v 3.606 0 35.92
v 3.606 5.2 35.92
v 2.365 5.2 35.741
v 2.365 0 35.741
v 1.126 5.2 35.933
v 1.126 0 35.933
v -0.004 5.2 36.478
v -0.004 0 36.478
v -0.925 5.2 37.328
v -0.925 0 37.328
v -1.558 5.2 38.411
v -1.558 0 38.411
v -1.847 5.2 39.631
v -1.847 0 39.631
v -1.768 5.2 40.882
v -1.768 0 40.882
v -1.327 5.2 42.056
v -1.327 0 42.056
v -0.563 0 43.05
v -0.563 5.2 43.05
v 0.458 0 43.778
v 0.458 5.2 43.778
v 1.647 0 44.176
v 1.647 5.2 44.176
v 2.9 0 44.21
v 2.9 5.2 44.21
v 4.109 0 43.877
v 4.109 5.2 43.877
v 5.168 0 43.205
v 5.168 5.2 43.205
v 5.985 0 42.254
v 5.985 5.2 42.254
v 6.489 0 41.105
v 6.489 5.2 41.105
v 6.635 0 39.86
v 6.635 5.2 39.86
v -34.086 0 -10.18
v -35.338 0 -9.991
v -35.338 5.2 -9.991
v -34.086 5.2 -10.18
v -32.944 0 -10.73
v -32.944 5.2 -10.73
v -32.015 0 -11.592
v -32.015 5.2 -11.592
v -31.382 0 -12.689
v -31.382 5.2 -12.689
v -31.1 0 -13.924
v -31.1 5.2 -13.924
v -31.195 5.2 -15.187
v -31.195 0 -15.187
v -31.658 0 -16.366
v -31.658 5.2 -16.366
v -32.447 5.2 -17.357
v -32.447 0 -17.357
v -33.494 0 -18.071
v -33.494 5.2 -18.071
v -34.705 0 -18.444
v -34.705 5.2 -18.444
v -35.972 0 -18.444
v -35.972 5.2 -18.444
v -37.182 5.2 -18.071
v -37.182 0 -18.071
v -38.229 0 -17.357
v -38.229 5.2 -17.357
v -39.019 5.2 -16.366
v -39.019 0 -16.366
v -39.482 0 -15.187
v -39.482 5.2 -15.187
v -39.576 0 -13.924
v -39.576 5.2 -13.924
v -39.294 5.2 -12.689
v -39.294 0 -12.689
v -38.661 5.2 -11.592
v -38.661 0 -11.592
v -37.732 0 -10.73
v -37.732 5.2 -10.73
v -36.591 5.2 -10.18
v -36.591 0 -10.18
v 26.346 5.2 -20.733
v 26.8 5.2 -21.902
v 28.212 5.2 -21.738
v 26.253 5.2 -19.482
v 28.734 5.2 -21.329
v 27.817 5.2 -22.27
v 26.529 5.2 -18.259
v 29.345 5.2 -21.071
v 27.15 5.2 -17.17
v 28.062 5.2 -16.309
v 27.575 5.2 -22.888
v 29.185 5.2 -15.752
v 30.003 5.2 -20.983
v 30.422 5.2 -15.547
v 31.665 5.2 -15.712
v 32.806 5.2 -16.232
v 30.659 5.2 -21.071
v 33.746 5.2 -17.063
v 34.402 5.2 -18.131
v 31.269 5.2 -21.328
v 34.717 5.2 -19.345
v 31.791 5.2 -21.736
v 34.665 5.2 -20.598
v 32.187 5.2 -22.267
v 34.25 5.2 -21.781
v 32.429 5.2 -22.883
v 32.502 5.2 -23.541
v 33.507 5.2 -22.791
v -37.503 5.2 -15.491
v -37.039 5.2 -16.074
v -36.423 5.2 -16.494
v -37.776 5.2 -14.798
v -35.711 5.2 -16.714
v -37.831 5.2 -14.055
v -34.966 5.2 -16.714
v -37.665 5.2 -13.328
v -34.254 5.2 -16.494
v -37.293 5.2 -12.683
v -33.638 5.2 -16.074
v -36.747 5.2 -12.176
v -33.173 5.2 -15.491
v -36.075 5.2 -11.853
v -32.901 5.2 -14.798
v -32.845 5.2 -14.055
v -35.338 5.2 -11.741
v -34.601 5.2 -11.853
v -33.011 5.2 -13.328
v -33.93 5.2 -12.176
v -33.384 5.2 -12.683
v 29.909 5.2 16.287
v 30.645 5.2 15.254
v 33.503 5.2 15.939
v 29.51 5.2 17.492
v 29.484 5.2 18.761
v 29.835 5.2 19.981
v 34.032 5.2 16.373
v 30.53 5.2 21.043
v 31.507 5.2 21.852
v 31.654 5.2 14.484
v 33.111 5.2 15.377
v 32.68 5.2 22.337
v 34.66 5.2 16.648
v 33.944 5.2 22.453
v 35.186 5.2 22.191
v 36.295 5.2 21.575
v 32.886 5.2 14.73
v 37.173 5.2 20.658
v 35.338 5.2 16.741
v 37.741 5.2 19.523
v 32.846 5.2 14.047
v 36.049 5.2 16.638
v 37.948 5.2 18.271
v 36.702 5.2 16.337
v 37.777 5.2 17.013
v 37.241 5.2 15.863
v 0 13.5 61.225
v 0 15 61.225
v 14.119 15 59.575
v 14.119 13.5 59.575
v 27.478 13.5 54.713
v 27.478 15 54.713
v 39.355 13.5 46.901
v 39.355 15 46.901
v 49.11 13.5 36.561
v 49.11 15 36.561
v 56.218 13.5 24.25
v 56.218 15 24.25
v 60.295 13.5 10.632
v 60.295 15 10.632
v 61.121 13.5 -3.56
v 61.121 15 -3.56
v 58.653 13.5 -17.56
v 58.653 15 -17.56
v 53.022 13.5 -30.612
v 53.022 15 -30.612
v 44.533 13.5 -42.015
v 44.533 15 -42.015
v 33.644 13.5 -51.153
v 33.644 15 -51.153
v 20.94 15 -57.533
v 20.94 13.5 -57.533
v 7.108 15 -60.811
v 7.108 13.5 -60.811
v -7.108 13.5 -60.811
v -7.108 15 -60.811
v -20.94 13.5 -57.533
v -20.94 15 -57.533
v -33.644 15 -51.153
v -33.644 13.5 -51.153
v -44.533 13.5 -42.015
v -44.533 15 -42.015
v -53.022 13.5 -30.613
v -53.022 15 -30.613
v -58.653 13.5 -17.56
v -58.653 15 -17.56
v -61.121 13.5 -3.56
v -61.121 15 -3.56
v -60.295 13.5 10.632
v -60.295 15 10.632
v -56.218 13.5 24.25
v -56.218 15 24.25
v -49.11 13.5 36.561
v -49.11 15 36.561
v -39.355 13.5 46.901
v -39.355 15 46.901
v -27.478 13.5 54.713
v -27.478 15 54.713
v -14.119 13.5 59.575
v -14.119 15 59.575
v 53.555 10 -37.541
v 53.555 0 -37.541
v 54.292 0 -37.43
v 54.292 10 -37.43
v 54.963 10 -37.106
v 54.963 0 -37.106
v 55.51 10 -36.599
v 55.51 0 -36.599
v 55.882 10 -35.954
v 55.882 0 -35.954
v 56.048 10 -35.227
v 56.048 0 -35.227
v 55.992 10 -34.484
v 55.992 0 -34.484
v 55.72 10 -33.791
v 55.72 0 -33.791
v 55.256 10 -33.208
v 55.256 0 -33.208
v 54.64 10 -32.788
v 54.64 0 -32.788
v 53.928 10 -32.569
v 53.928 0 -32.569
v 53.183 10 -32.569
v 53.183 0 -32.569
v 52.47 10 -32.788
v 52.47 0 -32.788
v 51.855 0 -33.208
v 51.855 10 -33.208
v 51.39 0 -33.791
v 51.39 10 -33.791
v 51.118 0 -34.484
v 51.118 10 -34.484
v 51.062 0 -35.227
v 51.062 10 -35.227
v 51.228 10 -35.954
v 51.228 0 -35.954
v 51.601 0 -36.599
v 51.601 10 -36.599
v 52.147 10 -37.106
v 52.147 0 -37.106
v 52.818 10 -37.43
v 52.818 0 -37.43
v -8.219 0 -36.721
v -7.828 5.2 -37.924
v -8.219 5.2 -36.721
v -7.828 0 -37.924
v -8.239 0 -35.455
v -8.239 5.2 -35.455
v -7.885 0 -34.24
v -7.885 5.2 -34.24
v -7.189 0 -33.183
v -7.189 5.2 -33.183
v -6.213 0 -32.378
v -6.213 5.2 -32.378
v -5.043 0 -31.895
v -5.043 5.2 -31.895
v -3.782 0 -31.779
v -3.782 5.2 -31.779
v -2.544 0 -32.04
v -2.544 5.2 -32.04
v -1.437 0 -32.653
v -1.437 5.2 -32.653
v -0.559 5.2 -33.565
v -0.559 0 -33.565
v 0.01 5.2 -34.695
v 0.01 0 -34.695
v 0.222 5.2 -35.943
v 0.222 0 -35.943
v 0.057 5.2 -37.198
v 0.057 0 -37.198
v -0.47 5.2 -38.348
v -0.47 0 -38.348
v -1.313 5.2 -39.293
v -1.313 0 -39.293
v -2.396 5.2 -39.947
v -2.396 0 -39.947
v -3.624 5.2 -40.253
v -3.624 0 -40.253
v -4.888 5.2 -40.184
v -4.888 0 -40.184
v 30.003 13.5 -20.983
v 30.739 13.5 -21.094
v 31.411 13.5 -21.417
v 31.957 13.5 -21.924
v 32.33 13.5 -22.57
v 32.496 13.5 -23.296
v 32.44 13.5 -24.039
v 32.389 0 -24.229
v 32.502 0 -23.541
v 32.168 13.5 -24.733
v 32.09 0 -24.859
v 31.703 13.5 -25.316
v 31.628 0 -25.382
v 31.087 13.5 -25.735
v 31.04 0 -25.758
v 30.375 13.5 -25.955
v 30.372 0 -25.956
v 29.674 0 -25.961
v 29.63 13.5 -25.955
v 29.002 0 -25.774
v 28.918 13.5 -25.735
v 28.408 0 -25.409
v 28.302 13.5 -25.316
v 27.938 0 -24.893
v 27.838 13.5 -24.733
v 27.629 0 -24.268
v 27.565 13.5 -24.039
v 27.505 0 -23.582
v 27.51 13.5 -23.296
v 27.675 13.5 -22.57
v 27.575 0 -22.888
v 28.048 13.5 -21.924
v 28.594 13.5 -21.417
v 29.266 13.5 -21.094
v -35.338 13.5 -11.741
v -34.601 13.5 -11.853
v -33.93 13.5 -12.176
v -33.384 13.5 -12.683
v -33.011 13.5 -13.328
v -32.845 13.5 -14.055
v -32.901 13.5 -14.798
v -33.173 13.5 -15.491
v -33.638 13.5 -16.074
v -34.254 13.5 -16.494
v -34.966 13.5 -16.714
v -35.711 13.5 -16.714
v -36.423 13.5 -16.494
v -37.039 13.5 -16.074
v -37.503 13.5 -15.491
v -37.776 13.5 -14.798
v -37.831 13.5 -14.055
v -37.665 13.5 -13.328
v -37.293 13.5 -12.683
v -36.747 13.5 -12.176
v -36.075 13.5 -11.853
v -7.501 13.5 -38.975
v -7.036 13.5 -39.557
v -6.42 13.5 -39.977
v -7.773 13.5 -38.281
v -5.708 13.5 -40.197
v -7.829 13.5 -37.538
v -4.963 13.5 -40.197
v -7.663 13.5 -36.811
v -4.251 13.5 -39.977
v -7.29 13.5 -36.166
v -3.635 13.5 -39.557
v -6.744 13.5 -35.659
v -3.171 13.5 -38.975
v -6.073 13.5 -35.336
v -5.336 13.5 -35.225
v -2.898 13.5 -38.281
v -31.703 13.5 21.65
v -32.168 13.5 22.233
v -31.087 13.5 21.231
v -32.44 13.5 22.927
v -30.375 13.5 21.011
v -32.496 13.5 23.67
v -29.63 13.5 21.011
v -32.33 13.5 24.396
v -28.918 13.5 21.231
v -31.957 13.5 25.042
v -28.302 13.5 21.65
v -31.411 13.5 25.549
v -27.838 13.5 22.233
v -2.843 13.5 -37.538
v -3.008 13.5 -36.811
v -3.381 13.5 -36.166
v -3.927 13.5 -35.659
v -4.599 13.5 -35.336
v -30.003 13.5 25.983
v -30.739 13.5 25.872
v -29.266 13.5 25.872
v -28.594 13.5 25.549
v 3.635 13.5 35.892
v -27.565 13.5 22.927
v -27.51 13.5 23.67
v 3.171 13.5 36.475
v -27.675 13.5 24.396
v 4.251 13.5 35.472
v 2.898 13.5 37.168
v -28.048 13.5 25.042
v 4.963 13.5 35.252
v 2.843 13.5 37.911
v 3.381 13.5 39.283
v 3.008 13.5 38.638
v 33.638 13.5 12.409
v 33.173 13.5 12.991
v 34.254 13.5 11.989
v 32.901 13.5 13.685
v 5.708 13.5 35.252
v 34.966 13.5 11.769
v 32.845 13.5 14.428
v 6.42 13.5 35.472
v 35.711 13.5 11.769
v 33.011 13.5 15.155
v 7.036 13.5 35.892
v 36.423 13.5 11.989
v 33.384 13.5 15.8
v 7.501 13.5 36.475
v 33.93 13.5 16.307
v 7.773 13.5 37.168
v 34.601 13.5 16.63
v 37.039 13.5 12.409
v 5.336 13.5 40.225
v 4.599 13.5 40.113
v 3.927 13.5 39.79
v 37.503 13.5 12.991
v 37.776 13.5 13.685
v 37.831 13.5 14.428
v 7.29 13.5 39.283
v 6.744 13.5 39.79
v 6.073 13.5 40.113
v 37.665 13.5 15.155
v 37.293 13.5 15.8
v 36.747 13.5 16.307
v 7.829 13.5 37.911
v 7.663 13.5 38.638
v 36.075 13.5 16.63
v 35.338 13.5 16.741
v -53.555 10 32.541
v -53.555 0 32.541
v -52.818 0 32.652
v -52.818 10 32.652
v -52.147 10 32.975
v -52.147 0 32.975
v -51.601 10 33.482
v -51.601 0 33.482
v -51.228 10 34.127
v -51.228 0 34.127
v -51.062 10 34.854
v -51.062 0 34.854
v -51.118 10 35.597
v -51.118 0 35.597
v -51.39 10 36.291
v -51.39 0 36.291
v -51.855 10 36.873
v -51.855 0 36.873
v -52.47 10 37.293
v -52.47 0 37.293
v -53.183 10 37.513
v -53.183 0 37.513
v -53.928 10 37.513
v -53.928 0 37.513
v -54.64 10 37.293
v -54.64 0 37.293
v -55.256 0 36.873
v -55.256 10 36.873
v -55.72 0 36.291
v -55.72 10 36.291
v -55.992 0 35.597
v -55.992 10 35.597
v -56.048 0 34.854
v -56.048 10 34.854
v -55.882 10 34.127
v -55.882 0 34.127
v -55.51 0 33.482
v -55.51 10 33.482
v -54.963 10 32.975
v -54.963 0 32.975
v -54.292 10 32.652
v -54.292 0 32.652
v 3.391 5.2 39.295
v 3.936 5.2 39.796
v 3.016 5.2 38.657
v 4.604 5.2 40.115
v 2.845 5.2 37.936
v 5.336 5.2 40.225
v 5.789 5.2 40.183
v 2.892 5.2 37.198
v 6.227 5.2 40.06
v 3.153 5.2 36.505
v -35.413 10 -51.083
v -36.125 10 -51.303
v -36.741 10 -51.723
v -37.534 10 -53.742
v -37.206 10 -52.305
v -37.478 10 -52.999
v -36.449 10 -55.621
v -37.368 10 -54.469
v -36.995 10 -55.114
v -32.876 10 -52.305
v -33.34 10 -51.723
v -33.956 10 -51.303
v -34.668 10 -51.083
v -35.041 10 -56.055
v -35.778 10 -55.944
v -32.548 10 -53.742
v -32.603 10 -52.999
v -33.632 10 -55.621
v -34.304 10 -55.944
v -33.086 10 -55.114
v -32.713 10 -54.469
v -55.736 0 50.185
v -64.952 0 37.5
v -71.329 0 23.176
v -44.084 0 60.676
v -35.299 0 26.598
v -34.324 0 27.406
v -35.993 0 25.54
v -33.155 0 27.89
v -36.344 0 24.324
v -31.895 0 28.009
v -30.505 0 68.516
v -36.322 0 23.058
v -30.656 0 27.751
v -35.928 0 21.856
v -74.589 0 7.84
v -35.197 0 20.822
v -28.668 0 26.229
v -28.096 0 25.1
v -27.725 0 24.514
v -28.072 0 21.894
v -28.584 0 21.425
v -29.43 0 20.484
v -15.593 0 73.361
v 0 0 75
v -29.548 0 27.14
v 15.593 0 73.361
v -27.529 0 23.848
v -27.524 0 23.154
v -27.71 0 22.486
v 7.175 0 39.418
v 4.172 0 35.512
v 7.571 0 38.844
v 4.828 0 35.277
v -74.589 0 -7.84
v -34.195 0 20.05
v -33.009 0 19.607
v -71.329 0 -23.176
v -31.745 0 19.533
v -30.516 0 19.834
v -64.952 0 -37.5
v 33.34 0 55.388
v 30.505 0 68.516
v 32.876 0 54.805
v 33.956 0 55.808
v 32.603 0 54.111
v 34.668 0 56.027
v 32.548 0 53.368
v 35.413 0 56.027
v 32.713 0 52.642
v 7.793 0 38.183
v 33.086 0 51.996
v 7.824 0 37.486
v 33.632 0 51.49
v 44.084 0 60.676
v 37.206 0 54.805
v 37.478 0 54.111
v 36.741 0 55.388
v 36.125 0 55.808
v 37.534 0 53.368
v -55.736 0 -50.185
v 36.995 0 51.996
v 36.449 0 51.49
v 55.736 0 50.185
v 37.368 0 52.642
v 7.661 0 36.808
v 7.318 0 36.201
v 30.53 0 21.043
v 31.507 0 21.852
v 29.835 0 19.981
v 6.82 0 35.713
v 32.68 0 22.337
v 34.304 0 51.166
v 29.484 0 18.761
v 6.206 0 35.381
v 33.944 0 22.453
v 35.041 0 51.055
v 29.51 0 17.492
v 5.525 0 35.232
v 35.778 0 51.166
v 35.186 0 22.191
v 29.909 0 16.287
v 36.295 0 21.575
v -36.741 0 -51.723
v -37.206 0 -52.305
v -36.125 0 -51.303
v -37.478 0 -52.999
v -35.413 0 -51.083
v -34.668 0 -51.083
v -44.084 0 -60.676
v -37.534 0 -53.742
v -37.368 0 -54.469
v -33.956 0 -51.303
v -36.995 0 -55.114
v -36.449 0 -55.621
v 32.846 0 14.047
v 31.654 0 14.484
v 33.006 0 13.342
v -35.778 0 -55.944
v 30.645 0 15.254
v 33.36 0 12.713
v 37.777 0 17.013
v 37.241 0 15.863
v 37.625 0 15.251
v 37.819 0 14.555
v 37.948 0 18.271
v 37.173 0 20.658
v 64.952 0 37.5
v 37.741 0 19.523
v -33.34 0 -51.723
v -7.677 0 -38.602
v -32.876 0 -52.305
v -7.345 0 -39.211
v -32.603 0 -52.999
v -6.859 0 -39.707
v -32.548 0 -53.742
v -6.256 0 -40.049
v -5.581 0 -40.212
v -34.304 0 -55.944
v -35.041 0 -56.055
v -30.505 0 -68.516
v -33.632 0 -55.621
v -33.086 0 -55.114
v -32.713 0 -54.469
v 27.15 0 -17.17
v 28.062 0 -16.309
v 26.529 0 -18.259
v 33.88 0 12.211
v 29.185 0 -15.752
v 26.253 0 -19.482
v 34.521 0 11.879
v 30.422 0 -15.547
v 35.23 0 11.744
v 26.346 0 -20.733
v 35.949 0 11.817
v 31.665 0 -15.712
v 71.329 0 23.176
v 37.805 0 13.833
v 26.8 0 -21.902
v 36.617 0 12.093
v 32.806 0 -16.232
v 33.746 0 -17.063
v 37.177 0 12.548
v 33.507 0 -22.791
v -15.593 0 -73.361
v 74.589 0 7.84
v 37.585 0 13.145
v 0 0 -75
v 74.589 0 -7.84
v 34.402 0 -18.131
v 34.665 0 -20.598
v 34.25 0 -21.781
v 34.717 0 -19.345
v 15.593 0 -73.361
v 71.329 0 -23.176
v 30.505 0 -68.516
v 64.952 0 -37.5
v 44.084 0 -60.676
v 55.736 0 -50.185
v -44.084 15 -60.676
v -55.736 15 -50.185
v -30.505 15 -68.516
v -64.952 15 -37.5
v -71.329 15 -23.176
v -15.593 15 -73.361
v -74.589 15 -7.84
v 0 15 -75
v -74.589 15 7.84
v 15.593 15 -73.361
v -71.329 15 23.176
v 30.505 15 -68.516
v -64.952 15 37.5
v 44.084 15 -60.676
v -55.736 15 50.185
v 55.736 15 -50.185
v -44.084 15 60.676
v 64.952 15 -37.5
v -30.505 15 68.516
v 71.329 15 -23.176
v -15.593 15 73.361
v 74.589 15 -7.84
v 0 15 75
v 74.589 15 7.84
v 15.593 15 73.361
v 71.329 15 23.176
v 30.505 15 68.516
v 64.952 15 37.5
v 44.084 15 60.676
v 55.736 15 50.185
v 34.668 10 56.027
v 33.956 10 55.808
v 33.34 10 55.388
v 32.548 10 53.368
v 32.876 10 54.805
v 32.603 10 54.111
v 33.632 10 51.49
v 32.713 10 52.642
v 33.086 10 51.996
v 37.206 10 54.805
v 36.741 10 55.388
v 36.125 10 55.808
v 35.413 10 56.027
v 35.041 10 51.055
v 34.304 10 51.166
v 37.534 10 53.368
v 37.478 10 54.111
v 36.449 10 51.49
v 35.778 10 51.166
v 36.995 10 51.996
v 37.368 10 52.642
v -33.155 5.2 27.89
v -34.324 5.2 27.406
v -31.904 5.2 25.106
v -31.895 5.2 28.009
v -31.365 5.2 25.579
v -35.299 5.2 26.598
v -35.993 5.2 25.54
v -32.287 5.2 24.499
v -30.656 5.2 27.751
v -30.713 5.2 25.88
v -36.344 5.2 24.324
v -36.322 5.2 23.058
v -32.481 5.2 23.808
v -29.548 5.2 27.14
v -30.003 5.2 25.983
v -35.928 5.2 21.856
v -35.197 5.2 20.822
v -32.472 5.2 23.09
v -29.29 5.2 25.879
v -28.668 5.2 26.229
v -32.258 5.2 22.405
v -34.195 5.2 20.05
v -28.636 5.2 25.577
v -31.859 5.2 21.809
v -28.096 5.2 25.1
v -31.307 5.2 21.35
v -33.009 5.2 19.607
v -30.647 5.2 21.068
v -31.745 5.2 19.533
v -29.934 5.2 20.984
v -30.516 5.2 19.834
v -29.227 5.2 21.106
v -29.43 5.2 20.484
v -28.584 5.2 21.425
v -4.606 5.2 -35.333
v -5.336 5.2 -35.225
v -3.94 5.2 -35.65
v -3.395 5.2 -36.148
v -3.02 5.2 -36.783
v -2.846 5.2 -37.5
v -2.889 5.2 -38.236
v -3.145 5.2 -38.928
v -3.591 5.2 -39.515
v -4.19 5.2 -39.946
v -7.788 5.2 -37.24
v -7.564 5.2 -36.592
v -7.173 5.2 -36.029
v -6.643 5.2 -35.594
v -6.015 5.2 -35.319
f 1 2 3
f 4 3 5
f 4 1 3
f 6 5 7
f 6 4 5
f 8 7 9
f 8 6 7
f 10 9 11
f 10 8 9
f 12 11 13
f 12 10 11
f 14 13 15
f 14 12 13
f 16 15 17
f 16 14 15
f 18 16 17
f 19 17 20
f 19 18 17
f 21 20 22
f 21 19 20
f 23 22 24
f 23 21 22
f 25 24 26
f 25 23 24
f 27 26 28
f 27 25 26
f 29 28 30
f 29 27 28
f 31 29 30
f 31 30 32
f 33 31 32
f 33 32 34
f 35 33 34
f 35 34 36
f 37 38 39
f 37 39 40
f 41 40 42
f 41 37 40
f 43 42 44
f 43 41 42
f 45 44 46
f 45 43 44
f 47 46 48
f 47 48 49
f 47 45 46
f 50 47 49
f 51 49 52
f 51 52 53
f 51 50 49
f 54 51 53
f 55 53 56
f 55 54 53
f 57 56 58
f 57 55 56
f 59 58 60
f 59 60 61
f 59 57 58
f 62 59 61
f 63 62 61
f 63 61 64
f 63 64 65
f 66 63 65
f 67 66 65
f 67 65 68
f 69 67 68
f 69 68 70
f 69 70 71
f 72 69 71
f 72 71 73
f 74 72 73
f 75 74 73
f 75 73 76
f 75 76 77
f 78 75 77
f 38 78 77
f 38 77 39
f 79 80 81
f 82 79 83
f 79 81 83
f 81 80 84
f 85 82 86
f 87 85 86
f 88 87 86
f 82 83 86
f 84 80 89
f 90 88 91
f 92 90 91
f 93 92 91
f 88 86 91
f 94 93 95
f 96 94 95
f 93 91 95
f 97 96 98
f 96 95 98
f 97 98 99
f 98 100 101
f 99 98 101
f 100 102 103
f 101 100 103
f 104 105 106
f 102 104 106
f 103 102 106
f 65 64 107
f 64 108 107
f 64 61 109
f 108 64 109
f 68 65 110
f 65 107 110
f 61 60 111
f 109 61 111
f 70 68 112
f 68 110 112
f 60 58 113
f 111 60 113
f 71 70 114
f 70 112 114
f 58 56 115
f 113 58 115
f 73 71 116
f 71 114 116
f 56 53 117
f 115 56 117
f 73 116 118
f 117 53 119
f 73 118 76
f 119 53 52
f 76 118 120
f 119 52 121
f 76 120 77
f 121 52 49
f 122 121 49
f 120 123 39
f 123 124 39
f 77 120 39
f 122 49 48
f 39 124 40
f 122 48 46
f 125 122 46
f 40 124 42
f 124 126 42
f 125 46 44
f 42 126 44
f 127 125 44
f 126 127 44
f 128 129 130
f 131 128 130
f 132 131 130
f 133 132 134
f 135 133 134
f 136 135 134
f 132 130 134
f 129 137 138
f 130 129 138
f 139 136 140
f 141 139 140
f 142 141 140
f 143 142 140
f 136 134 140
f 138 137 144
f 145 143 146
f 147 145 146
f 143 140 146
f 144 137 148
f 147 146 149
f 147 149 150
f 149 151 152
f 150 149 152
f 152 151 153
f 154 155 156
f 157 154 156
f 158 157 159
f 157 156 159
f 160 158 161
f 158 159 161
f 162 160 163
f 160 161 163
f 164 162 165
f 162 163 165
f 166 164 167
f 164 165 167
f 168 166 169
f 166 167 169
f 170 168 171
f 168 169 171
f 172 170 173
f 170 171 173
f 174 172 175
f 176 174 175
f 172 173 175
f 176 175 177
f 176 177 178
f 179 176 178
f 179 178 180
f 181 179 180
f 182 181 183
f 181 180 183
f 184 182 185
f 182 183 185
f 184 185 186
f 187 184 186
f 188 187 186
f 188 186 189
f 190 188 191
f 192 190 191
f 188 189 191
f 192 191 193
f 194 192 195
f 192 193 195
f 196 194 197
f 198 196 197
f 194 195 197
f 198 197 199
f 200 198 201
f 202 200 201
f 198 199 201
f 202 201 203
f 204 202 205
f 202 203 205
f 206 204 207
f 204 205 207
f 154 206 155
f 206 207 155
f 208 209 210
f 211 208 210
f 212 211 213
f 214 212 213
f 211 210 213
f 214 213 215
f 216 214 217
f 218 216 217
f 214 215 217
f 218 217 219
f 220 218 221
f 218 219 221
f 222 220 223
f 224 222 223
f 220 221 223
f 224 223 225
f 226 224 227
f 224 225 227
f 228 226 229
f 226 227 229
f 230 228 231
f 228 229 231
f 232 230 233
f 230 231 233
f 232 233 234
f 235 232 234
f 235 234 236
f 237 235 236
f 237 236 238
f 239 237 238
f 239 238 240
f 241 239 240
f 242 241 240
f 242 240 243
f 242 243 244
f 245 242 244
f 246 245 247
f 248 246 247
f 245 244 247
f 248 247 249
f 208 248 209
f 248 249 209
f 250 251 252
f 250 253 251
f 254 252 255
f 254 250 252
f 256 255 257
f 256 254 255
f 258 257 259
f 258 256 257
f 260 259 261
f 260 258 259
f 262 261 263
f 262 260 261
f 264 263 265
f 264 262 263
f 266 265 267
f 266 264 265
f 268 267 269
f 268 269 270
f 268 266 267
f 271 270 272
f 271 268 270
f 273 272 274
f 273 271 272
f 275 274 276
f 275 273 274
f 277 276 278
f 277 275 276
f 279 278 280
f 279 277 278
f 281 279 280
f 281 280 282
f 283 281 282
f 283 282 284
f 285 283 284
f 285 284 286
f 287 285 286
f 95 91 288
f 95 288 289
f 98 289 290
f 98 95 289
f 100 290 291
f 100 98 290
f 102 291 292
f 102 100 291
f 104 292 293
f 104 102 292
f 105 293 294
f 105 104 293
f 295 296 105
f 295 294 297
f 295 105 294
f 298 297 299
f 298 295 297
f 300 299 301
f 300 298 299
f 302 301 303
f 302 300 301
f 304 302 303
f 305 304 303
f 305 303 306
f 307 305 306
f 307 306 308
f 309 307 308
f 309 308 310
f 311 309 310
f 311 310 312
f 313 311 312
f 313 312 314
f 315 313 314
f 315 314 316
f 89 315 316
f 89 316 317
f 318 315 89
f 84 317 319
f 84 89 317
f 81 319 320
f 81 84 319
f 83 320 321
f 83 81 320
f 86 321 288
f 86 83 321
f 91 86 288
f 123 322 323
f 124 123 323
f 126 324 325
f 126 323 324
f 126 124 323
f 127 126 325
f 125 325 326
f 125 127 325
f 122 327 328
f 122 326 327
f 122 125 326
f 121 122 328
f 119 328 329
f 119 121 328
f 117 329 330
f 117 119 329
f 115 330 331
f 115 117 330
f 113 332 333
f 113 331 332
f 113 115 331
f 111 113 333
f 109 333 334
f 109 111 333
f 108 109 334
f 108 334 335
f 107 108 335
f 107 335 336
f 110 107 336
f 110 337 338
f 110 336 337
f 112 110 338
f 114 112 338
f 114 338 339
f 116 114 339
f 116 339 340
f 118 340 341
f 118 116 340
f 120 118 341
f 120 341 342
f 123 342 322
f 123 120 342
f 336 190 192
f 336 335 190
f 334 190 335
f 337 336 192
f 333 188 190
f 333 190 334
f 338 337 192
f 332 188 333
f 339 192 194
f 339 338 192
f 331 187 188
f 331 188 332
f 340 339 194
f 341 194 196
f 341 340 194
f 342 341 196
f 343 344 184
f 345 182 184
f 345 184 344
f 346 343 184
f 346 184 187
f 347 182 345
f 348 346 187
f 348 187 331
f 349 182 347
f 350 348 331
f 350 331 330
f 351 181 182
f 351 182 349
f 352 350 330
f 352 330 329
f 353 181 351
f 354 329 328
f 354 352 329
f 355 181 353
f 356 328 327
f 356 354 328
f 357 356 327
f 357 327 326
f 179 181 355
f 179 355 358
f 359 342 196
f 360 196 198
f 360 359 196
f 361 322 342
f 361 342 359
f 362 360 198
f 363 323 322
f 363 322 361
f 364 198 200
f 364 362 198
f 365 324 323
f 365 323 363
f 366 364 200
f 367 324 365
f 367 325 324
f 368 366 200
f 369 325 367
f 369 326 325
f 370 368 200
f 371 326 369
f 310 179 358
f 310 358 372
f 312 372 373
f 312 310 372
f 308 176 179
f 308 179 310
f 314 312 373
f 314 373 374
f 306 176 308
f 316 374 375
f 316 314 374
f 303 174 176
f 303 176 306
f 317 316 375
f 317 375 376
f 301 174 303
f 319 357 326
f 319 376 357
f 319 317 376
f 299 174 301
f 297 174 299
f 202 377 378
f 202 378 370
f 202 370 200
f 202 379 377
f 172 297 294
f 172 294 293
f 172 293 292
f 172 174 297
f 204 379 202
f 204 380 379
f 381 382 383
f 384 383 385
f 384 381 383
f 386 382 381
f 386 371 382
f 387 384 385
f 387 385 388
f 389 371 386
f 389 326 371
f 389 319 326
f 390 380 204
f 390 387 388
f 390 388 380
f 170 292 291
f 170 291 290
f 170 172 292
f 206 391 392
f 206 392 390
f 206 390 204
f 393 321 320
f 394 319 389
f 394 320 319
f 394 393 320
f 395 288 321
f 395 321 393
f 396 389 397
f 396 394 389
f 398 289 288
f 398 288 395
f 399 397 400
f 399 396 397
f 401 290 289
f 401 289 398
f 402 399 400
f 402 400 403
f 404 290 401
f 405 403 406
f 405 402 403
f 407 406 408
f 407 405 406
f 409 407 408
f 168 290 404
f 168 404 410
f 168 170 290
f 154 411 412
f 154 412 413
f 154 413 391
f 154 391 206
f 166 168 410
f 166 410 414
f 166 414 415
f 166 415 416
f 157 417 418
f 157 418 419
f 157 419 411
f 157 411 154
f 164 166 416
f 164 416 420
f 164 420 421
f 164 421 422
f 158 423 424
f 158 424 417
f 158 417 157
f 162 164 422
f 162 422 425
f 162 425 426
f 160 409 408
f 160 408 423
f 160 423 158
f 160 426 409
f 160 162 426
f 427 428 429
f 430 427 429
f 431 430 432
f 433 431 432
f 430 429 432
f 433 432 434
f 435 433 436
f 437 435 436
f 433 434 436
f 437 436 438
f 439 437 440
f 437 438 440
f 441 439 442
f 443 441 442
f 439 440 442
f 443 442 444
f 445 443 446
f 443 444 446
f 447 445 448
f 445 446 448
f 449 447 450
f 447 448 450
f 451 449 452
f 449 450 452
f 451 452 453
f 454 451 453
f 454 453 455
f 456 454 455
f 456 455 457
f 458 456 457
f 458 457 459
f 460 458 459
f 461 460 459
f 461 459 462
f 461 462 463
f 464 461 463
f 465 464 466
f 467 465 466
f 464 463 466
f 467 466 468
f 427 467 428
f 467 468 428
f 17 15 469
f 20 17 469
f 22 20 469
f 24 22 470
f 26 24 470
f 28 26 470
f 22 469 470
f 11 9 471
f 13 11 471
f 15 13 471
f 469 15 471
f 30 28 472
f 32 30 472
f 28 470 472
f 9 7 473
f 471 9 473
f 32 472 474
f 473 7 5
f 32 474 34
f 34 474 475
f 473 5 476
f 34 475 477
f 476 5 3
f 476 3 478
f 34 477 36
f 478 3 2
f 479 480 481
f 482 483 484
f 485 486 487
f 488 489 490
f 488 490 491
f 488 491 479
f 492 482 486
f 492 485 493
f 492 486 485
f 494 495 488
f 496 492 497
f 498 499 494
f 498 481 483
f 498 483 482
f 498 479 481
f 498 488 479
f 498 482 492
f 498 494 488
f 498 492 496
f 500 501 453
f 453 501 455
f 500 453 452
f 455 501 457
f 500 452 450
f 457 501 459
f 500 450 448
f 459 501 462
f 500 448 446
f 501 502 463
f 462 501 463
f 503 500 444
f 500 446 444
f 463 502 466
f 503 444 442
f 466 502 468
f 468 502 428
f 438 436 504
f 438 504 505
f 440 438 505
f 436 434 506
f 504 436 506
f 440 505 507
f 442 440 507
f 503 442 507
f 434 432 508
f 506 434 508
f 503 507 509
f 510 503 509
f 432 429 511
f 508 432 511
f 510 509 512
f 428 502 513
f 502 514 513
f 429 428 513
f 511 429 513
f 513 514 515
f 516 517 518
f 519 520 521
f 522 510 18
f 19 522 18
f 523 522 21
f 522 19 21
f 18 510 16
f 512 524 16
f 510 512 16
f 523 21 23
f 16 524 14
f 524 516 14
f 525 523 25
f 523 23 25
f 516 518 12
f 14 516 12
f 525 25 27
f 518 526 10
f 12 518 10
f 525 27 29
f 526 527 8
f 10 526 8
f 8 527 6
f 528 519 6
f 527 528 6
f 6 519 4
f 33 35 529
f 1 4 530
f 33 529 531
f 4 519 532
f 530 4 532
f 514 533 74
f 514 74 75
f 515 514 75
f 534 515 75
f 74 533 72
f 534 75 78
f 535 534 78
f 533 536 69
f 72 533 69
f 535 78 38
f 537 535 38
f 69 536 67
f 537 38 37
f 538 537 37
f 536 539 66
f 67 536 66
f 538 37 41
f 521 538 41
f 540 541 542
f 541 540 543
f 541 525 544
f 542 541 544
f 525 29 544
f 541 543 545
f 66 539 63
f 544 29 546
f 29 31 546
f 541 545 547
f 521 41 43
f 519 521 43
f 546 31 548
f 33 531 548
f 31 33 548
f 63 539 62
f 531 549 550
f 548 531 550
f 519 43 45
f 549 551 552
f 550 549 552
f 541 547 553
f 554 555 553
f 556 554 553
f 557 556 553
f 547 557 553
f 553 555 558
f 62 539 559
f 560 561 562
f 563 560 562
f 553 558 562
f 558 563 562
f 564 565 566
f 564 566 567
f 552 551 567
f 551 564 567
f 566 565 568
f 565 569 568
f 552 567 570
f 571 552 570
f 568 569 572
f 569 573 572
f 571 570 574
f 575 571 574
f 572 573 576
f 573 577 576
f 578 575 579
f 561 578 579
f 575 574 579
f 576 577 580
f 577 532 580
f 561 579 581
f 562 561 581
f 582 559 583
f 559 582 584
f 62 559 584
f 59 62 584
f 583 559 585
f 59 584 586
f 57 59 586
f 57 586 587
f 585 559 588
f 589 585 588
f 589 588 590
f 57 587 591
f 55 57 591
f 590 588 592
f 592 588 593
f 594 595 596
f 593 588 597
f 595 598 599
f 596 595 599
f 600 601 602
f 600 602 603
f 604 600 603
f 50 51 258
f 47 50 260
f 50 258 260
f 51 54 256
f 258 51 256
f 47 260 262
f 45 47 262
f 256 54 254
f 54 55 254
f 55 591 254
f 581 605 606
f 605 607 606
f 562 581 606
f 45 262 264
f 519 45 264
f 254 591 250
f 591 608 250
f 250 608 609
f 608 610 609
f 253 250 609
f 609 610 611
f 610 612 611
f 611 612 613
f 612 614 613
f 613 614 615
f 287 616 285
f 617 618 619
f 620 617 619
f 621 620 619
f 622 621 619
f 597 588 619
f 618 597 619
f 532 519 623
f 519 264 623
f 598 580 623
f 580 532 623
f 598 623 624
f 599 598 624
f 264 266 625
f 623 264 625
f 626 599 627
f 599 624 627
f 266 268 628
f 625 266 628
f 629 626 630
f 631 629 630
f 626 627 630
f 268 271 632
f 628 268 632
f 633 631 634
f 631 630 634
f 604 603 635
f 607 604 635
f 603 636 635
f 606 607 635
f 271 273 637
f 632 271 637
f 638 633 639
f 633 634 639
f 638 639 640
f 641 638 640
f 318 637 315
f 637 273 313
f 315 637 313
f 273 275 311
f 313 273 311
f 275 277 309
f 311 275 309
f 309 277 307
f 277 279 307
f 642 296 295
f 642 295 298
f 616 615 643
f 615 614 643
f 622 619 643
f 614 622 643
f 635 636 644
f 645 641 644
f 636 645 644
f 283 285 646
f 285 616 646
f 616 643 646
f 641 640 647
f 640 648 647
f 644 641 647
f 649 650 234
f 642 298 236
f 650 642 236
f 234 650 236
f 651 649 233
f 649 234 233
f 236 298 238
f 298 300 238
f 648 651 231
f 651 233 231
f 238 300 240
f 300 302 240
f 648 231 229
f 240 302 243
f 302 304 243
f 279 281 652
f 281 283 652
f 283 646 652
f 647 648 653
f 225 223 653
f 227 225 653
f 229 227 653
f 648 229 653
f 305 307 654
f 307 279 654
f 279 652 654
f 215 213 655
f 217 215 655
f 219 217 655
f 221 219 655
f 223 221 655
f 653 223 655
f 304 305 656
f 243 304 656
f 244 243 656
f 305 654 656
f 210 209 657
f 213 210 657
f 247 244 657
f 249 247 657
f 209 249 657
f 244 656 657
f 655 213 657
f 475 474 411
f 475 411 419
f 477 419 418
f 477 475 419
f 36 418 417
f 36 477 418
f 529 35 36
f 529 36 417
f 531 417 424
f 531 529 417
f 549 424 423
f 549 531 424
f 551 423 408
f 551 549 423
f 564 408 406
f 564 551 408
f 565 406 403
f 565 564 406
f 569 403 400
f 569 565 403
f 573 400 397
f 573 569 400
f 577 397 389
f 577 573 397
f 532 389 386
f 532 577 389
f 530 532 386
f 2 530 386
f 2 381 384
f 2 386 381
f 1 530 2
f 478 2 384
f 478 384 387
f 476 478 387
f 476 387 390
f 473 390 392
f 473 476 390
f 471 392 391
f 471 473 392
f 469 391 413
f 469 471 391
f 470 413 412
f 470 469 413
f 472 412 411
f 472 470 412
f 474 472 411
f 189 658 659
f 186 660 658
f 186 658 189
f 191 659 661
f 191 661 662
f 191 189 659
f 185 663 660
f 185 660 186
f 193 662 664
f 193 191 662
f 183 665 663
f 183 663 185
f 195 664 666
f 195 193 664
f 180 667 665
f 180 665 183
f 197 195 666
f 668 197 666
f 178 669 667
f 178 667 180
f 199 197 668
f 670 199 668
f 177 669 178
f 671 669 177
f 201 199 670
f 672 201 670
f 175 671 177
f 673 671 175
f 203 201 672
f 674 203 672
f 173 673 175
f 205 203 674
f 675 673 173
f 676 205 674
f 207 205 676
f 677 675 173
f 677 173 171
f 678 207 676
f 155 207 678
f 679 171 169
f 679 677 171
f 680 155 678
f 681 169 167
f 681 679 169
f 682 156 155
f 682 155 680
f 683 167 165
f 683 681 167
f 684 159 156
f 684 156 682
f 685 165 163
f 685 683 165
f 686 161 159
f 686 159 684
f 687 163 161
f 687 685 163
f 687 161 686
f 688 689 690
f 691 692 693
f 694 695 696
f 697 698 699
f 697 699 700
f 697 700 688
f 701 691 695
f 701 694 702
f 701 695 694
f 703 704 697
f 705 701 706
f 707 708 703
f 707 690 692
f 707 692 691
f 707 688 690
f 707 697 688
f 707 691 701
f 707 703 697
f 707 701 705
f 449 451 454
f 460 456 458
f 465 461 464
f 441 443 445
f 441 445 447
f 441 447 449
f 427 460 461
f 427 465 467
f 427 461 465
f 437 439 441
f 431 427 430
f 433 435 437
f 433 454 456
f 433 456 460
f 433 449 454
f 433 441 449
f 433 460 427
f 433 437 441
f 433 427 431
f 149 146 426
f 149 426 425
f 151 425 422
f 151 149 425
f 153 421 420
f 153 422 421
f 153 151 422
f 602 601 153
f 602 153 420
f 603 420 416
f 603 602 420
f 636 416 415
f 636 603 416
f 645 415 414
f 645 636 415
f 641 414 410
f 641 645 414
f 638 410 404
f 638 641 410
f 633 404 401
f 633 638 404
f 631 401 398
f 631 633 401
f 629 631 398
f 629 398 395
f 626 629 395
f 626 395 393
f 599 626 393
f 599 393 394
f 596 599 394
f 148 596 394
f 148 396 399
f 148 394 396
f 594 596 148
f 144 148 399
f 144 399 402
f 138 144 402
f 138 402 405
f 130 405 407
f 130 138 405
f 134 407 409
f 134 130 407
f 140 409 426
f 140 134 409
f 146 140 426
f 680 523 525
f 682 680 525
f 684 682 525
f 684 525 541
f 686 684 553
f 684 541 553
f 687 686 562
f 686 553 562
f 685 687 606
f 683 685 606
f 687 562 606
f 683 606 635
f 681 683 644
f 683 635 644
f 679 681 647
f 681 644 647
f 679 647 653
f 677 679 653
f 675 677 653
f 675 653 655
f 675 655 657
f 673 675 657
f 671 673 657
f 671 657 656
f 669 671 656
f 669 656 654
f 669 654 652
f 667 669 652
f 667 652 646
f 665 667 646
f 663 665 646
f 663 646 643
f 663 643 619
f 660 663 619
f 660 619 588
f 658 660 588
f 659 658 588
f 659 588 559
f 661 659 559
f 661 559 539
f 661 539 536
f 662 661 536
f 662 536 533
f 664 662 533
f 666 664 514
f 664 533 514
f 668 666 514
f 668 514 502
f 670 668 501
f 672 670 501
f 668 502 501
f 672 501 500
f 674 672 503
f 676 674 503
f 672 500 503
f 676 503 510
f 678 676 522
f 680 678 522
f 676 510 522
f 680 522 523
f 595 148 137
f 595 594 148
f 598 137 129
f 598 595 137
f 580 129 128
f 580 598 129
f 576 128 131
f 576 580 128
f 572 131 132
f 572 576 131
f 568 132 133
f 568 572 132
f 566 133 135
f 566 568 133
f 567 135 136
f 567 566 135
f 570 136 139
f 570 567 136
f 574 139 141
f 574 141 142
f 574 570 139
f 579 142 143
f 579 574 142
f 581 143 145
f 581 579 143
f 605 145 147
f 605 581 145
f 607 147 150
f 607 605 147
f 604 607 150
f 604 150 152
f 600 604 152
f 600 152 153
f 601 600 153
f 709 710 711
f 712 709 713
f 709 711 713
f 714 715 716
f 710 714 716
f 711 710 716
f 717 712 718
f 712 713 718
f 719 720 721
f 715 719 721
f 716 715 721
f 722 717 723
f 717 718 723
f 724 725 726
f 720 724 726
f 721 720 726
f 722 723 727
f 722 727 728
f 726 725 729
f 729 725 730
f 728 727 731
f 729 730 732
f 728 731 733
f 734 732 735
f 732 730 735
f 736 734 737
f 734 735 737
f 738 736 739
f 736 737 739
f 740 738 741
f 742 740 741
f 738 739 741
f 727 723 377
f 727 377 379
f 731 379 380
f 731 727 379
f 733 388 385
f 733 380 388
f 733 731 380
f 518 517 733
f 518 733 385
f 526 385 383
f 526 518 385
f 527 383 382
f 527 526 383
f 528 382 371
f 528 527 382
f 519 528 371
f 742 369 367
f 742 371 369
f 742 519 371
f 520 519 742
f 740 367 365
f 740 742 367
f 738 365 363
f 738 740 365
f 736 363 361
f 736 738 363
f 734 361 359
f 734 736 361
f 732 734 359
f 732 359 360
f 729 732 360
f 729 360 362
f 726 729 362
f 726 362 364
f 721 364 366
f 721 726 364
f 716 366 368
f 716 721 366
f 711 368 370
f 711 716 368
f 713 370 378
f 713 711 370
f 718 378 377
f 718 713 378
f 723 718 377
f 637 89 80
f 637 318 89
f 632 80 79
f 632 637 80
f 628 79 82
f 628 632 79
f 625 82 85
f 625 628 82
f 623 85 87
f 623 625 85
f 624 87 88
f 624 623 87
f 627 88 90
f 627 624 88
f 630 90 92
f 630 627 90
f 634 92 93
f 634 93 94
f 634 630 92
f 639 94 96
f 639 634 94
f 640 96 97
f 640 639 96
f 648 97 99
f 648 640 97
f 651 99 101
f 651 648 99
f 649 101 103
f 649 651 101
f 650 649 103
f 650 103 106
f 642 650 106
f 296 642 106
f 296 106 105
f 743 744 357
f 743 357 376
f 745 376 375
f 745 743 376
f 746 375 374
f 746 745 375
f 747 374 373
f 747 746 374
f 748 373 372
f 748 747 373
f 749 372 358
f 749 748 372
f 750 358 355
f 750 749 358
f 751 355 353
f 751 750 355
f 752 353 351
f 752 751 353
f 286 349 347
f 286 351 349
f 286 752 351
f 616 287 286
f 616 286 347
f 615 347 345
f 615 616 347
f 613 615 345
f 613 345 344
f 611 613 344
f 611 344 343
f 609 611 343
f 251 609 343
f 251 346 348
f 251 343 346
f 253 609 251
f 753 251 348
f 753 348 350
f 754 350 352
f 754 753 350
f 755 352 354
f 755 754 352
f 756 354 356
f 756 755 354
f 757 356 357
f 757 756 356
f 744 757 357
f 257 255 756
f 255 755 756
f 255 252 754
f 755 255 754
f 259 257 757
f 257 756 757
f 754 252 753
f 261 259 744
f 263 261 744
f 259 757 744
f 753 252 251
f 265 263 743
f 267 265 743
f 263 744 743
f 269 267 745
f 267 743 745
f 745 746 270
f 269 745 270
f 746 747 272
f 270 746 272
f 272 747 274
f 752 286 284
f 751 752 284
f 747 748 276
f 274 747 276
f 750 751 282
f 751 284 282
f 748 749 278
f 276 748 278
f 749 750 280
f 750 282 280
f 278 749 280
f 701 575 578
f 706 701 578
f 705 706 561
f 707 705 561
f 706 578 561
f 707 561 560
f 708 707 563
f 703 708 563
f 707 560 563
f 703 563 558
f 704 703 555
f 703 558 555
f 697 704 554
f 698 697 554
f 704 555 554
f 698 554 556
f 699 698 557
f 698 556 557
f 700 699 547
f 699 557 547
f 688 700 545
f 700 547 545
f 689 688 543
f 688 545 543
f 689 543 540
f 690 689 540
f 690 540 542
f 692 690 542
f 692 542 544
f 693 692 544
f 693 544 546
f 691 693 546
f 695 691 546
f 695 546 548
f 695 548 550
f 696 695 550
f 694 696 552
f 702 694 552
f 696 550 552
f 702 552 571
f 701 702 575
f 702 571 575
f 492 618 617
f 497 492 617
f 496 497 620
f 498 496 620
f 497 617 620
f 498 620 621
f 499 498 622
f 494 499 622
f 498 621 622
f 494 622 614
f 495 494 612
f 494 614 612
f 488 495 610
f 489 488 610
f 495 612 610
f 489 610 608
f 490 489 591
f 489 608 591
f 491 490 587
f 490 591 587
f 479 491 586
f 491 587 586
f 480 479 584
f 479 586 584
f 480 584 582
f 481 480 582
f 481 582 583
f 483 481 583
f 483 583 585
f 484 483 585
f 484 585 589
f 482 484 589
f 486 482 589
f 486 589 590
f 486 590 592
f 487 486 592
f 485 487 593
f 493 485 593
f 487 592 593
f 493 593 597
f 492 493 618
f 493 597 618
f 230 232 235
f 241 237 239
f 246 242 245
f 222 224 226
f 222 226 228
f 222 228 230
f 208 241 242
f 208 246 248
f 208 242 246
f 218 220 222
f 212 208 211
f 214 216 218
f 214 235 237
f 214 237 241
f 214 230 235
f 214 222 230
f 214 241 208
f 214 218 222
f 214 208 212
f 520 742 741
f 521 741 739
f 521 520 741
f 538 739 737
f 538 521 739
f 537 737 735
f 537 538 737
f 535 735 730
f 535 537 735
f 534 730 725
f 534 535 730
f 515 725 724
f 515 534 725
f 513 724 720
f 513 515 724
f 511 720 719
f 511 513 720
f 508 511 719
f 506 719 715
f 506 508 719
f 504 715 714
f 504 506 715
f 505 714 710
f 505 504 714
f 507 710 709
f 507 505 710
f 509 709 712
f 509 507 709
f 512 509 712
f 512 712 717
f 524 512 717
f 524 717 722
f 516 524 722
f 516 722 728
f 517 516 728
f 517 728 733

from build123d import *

# Parameters (mm, degrees)
CROQUIS1_R                 = 75
CROQUIS1_R_2               = 61.225
SALIENTE_EXTRUIR1_DEPTH    = 15
CORTAR_EXTRUIR3_START      = 15
CROQUIS1_4_OUTSIDE_W       = 194.532
CROQUIS1_4_OUTSIDE_H       = 194.532
CROQUIS1_4_OUTSIDE_R       = 75
CROQUIS1_4_OUTSIDE_R_2     = 61.225
CORTAR_EXTRUIR3_DEPTH      = 1.5
CORTAR_EXTRUIR5_DEPTH      = 107.921700323
CORTAR_EXTRUIR5_DEPTH_BACK = 107.921700323
CROQUIS2_R                 = 2.5
CORTAR_EXTRUIR6_DEPTH      = 5.2
CORTAR_EXTRUIR6_DEPTH_BACK = 107.921700323
CORTAR_EXTRUIR6_START      = -13.5
CROQUIS2_4_R               = 4.25
CROQUIS3_R                 = 2.5
CORTAR_EXTRUIR7_DEPTH      = 10


with BuildPart() as part:
    # Croquis1 → Saliente-Extruir1 (new body)
    # profile 1 of 2: a face of its own
    with BuildSketch(Plane(origin=(0, 0, 0), x_dir=(1, 0, 0), z_dir=(0, 1, 0))):
        with Locations(Location((0, 0, 0), (0, 0, 270))):
            Circle(CROQUIS1_R)
        Circle(CROQUIS1_R_2, mode=Mode.SUBTRACT)
    # profile 2 of 2: a face of its own
    with BuildSketch(Plane(origin=(0, 0, 0), x_dir=(1, 0, 0), z_dir=(0, 1, 0))):
        Circle(CROQUIS1_R_2)
    extrude(amount=SALIENTE_EXTRUIR1_DEPTH)

    # Croquis1<4> outside → Cortar-Extruir3 (cut)
    # profile 1 of 2: a face of its own
    with BuildSketch(Plane(origin=(0, 0, 0), x_dir=(1, 0, 0), z_dir=(0, 1, 0)).offset(CORTAR_EXTRUIR3_START)):
        Rectangle(CROQUIS1_4_OUTSIDE_W, CROQUIS1_4_OUTSIDE_H)
        with Locations(Location((0, 0, 0), (0, 0, 270))):
            Circle(CROQUIS1_4_OUTSIDE_R, mode=Mode.SUBTRACT)
    # profile 2 of 2: a face of its own
    with BuildSketch(Plane(origin=(0, 0, 0), x_dir=(1, 0, 0), z_dir=(0, 1, 0)).offset(CORTAR_EXTRUIR3_START)):
        with Locations(Location((0, 0, 0), (0, 0, 270))):
            Circle(CROQUIS1_4_OUTSIDE_R_2)
    extrude(amount=-CORTAR_EXTRUIR3_DEPTH, mode=Mode.SUBTRACT)

    # Croquis2 → Cortar-Extruir5 (cut, two sides: drawn at the far end of the back side and taken through both)
    with BuildSketch(Plane(origin=(0, 13.5, 0), x_dir=(1, 0, 0), z_dir=(0, 1, 0)).offset(-CORTAR_EXTRUIR5_DEPTH_BACK)):
        with Locations(Location((-35.338232438, 14.241465098, 0), (0, 0, 270))):
            Circle(CROQUIS2_R)
        with Locations(Location((-5.335645657, 37.724539565, 0), (0, 0, 270))):
            Circle(CROQUIS2_R)
        with Locations(Location((30.002586781, 23.483074467, 0), (0, 0, 270))):
            Circle(CROQUIS2_R)
        with Locations(Location((35.338232438, -14.241465098, 0), (0, 0, 270))):
            Circle(CROQUIS2_R)
        with Locations(Location((5.335645657, -37.724539565, 0), (0, 0, 270))):
            Circle(CROQUIS2_R)
        with Locations(Location((-30.002586781, -23.483074467, 0), (0, 0, 270))):
            Circle(CROQUIS2_R)
    extrude(amount=CORTAR_EXTRUIR5_DEPTH + CORTAR_EXTRUIR5_DEPTH_BACK, mode=Mode.SUBTRACT)

    # Croquis2<4> → Cortar-Extruir6 (cut, two sides: drawn at the far end of the back side and taken through both)
    with BuildSketch(Plane(origin=(0, 13.5, 0), x_dir=(1, 0, 0), z_dir=(0, 1, 0)).offset(CORTAR_EXTRUIR6_START - CORTAR_EXTRUIR6_DEPTH_BACK)):
        with Locations(Location((-35.338232438, 14.241465098, 0), (0, 0, 270))):
            Circle(CROQUIS2_4_R)
        with Locations((-4.027016235, 36.022318165)):
            Circle(CROQUIS2_4_R)
        with Locations((30.491363939, 19.796436043)):
            Circle(CROQUIS2_4_R)
        with Locations((33.698527909, -18.210299146)):
            Circle(CROQUIS2_4_R)
        with Locations((2.387311706, -39.991152213)):
            Circle(CROQUIS2_4_R)
        with Locations((-32.131068468, -23.765270091)):
            Circle(CROQUIS2_4_R)
    extrude(amount=CORTAR_EXTRUIR6_DEPTH + CORTAR_EXTRUIR6_DEPTH_BACK, mode=Mode.SUBTRACT)

    # Croquis3 → Cortar-Extruir7 (cut)
    with BuildSketch(Plane.XZ):
        with Locations(Location((35.040630993, 53.555151962, 0), (0, 0, 270))):
            Circle(CROQUIS3_R)
        with Locations(Location((-53.555151962, 35.040630993, 0), (0, 0, 270))):
            Circle(CROQUIS3_R)
        with Locations(Location((53.555151962, -35.040630993, 0), (0, 0, 270))):
            Circle(CROQUIS3_R)
        with Locations(Location((-35.040630993, -53.555151962, 0), (0, 0, 270))):
            Circle(CROQUIS3_R)
    extrude(amount=-CORTAR_EXTRUIR7_DEPTH, mode=Mode.SUBTRACT)


solid = part.part
